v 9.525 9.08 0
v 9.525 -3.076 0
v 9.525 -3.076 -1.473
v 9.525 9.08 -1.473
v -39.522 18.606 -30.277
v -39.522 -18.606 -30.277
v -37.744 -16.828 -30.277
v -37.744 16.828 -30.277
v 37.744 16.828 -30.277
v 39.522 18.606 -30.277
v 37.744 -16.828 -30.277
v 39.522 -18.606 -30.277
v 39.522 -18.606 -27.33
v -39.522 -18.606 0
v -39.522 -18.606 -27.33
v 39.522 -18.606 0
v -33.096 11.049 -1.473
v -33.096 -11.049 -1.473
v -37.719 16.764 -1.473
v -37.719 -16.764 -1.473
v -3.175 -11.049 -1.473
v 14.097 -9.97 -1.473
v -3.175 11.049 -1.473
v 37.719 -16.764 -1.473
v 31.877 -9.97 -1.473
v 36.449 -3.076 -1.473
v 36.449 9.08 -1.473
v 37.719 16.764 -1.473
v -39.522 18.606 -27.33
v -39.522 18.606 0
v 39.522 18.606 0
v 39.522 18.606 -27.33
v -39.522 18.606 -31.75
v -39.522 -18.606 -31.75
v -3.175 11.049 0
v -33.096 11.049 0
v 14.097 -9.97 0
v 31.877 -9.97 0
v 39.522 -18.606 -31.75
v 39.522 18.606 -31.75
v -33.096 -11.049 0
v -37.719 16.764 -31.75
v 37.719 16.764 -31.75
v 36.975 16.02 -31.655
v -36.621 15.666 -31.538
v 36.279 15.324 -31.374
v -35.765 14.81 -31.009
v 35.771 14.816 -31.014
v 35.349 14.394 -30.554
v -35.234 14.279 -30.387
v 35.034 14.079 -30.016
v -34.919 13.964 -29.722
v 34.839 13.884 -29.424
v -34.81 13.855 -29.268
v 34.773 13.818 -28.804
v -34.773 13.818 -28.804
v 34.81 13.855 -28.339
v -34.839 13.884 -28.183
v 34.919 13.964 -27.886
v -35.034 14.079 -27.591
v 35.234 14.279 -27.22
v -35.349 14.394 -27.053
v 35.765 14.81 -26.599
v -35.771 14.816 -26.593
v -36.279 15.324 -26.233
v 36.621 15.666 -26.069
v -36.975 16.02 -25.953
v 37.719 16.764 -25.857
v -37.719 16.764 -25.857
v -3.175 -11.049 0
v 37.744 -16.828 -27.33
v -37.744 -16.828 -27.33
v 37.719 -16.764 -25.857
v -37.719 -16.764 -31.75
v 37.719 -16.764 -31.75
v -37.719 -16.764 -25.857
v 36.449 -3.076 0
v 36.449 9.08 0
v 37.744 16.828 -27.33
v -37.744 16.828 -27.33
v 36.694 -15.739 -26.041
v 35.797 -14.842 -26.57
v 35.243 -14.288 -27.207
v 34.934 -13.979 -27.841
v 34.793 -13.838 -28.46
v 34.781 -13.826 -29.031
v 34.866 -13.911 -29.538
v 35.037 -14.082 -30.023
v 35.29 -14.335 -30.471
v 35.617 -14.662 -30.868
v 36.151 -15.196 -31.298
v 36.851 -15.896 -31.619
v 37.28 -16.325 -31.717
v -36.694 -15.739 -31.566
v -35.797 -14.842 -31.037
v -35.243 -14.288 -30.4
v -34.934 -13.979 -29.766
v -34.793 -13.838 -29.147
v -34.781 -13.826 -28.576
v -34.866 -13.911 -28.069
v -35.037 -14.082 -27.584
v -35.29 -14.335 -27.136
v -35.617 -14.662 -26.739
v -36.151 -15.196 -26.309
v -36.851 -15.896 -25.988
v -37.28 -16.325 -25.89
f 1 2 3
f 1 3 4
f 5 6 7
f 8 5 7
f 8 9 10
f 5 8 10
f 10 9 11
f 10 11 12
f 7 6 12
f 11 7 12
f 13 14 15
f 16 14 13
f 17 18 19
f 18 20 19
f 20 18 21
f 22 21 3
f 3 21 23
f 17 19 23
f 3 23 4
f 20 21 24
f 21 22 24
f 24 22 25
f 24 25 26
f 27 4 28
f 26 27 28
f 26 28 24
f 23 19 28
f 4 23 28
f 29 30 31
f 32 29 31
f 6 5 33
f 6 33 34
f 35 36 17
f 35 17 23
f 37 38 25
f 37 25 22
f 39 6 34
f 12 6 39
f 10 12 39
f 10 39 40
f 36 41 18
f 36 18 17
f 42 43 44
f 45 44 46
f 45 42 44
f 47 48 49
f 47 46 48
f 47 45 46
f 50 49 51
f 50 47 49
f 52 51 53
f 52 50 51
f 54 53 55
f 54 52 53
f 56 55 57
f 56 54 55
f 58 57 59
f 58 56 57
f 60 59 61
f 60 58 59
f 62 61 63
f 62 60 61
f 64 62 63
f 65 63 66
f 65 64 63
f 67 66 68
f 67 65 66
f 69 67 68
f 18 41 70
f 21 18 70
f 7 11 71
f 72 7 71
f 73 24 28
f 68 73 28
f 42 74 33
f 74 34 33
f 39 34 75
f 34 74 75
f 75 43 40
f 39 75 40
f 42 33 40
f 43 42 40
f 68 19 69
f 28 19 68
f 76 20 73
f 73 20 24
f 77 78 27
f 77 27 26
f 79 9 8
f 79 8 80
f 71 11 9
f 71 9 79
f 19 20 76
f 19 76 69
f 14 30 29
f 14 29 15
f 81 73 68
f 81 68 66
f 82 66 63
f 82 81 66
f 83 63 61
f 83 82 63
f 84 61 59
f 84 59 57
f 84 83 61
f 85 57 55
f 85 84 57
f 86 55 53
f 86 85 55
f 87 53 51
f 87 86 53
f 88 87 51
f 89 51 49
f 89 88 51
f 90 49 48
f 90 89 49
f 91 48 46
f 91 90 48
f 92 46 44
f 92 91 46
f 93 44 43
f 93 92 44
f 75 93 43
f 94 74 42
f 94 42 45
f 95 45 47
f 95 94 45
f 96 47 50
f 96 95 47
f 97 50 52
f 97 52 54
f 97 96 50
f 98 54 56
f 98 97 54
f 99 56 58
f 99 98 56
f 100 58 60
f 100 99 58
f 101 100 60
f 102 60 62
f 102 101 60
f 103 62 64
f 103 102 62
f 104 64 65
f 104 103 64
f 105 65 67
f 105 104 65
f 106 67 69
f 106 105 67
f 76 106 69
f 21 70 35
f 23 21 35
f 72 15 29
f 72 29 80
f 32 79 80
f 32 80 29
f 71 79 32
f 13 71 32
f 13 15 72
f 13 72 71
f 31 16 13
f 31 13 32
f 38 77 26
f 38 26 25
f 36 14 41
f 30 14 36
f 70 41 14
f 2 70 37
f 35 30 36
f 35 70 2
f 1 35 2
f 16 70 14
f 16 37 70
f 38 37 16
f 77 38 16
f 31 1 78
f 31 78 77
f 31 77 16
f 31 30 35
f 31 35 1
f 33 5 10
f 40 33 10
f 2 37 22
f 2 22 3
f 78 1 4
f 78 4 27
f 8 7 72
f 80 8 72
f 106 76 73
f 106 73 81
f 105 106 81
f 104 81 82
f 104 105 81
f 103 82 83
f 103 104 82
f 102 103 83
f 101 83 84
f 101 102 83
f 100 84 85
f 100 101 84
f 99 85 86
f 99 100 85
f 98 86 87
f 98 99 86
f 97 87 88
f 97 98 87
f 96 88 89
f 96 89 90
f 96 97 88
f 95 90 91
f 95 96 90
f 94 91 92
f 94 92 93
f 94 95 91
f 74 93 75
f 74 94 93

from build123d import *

# Parameters (mm, degrees)
F0_W      = 79.0448
F0_H      = 37.211
F0_W_2    = 75.438
F0_H_2    = 33.528
F1_DEPTH  = 31.75
F0_W_3    = 29.9212
F0_H_3    = 22.098
F2_DEPTH  = 1.4732
F5_DEPTH  = 35.3695
F7_DEPTH  = 77.2414
F8_W      = 1.778
F8_H      = 2.9464
F9_DEPTH  = 37.211
F10_W     = 1.778
F10_H     = 2.9464
F11_DEPTH = 75.4888


with BuildPart() as f1:
    # F0 (on Top) → F1 (new body)
    with BuildSketch(Plane.XY):
        Rectangle(F0_W, F0_H)
        Rectangle(F0_W_2, F0_H_2, mode=Mode.SUBTRACT)
    extrude(amount=-F1_DEPTH)

    # F0 (on Top) → F2 (join)
    with BuildSketch(Plane.XY):
        Rectangle(F0_W_2, F0_H_2)
        with Locations((-18.1356, 0)):
            Rectangle(F0_W_3, F0_H_3, mode=Mode.SUBTRACT)
        Polygon((9.525, 9.0805), (36.449, 9.0805), (36.449, -3.07601), (31.877, -9.9695), (14.097, -9.9695), (9.525, -3.07601), align=None, mode=Mode.SUBTRACT)
    extrude(amount=-F2_DEPTH)

    # F4 (on face) → F5 (join, through all)
    with BuildSketch(Plane.XZ.offset(18.6055)):
        with BuildLine():
            Line((-37.719, -25.8572), (-37.719, -31.75))
            ThreePointArc((-37.719, -31.75), (-34.7726, -28.8036), (-37.719, -25.8572))
        make_face()
        with BuildLine():
            Line((37.719, -31.75), (37.719, -25.8572))
            ThreePointArc((37.719, -25.8572), (34.7726, -28.8036), (37.719, -31.75))
        make_face()
    extrude(amount=-F5_DEPTH)

    # F6 (on face) → F7 (join, through all)
    with BuildSketch(Plane(origin=(-39.5224, 0, 0), x_dir=(0, -1, 0), z_dir=(-1, 0, 0))):
        with BuildLine():
            Line((-16.764, -25.8572), (-16.764, -31.75))
            ThreePointArc((-16.764, -31.75), (-13.8176, -28.8036), (-16.764, -25.8572))
        make_face()
        with BuildLine():
            Line((16.764, -31.75), (16.764, -25.8572))
            ThreePointArc((16.764, -25.8572), (13.8176, -28.8036), (16.764, -31.75))
        make_face()
    extrude(amount=-F7_DEPTH)

    # F8 (on face) → F9 (cut, through all)
    with BuildSketch(Plane.XZ.offset(18.6055)):
        with Locations((-38.6334, -28.8036)):
            Rectangle(F8_W, F8_H)
        with Locations((38.6334, -28.8036)):
            Rectangle(F8_W, F8_H)
    extrude(amount=-F9_DEPTH, mode=Mode.SUBTRACT)

    # F10 (on face) → F11 (cut, through all)
    with BuildSketch(Plane(origin=(-37.7444, 0, 0), x_dir=(0, -1, 0), z_dir=(-1, 0, 0))):
        with Locations((-17.7165, -28.8036)):
            Rectangle(F10_W, F10_H)
        with Locations((17.7165, -28.8036)):
            Rectangle(F10_W, F10_H)
    extrude(amount=-F11_DEPTH, mode=Mode.SUBTRACT)


solid = f1.part
